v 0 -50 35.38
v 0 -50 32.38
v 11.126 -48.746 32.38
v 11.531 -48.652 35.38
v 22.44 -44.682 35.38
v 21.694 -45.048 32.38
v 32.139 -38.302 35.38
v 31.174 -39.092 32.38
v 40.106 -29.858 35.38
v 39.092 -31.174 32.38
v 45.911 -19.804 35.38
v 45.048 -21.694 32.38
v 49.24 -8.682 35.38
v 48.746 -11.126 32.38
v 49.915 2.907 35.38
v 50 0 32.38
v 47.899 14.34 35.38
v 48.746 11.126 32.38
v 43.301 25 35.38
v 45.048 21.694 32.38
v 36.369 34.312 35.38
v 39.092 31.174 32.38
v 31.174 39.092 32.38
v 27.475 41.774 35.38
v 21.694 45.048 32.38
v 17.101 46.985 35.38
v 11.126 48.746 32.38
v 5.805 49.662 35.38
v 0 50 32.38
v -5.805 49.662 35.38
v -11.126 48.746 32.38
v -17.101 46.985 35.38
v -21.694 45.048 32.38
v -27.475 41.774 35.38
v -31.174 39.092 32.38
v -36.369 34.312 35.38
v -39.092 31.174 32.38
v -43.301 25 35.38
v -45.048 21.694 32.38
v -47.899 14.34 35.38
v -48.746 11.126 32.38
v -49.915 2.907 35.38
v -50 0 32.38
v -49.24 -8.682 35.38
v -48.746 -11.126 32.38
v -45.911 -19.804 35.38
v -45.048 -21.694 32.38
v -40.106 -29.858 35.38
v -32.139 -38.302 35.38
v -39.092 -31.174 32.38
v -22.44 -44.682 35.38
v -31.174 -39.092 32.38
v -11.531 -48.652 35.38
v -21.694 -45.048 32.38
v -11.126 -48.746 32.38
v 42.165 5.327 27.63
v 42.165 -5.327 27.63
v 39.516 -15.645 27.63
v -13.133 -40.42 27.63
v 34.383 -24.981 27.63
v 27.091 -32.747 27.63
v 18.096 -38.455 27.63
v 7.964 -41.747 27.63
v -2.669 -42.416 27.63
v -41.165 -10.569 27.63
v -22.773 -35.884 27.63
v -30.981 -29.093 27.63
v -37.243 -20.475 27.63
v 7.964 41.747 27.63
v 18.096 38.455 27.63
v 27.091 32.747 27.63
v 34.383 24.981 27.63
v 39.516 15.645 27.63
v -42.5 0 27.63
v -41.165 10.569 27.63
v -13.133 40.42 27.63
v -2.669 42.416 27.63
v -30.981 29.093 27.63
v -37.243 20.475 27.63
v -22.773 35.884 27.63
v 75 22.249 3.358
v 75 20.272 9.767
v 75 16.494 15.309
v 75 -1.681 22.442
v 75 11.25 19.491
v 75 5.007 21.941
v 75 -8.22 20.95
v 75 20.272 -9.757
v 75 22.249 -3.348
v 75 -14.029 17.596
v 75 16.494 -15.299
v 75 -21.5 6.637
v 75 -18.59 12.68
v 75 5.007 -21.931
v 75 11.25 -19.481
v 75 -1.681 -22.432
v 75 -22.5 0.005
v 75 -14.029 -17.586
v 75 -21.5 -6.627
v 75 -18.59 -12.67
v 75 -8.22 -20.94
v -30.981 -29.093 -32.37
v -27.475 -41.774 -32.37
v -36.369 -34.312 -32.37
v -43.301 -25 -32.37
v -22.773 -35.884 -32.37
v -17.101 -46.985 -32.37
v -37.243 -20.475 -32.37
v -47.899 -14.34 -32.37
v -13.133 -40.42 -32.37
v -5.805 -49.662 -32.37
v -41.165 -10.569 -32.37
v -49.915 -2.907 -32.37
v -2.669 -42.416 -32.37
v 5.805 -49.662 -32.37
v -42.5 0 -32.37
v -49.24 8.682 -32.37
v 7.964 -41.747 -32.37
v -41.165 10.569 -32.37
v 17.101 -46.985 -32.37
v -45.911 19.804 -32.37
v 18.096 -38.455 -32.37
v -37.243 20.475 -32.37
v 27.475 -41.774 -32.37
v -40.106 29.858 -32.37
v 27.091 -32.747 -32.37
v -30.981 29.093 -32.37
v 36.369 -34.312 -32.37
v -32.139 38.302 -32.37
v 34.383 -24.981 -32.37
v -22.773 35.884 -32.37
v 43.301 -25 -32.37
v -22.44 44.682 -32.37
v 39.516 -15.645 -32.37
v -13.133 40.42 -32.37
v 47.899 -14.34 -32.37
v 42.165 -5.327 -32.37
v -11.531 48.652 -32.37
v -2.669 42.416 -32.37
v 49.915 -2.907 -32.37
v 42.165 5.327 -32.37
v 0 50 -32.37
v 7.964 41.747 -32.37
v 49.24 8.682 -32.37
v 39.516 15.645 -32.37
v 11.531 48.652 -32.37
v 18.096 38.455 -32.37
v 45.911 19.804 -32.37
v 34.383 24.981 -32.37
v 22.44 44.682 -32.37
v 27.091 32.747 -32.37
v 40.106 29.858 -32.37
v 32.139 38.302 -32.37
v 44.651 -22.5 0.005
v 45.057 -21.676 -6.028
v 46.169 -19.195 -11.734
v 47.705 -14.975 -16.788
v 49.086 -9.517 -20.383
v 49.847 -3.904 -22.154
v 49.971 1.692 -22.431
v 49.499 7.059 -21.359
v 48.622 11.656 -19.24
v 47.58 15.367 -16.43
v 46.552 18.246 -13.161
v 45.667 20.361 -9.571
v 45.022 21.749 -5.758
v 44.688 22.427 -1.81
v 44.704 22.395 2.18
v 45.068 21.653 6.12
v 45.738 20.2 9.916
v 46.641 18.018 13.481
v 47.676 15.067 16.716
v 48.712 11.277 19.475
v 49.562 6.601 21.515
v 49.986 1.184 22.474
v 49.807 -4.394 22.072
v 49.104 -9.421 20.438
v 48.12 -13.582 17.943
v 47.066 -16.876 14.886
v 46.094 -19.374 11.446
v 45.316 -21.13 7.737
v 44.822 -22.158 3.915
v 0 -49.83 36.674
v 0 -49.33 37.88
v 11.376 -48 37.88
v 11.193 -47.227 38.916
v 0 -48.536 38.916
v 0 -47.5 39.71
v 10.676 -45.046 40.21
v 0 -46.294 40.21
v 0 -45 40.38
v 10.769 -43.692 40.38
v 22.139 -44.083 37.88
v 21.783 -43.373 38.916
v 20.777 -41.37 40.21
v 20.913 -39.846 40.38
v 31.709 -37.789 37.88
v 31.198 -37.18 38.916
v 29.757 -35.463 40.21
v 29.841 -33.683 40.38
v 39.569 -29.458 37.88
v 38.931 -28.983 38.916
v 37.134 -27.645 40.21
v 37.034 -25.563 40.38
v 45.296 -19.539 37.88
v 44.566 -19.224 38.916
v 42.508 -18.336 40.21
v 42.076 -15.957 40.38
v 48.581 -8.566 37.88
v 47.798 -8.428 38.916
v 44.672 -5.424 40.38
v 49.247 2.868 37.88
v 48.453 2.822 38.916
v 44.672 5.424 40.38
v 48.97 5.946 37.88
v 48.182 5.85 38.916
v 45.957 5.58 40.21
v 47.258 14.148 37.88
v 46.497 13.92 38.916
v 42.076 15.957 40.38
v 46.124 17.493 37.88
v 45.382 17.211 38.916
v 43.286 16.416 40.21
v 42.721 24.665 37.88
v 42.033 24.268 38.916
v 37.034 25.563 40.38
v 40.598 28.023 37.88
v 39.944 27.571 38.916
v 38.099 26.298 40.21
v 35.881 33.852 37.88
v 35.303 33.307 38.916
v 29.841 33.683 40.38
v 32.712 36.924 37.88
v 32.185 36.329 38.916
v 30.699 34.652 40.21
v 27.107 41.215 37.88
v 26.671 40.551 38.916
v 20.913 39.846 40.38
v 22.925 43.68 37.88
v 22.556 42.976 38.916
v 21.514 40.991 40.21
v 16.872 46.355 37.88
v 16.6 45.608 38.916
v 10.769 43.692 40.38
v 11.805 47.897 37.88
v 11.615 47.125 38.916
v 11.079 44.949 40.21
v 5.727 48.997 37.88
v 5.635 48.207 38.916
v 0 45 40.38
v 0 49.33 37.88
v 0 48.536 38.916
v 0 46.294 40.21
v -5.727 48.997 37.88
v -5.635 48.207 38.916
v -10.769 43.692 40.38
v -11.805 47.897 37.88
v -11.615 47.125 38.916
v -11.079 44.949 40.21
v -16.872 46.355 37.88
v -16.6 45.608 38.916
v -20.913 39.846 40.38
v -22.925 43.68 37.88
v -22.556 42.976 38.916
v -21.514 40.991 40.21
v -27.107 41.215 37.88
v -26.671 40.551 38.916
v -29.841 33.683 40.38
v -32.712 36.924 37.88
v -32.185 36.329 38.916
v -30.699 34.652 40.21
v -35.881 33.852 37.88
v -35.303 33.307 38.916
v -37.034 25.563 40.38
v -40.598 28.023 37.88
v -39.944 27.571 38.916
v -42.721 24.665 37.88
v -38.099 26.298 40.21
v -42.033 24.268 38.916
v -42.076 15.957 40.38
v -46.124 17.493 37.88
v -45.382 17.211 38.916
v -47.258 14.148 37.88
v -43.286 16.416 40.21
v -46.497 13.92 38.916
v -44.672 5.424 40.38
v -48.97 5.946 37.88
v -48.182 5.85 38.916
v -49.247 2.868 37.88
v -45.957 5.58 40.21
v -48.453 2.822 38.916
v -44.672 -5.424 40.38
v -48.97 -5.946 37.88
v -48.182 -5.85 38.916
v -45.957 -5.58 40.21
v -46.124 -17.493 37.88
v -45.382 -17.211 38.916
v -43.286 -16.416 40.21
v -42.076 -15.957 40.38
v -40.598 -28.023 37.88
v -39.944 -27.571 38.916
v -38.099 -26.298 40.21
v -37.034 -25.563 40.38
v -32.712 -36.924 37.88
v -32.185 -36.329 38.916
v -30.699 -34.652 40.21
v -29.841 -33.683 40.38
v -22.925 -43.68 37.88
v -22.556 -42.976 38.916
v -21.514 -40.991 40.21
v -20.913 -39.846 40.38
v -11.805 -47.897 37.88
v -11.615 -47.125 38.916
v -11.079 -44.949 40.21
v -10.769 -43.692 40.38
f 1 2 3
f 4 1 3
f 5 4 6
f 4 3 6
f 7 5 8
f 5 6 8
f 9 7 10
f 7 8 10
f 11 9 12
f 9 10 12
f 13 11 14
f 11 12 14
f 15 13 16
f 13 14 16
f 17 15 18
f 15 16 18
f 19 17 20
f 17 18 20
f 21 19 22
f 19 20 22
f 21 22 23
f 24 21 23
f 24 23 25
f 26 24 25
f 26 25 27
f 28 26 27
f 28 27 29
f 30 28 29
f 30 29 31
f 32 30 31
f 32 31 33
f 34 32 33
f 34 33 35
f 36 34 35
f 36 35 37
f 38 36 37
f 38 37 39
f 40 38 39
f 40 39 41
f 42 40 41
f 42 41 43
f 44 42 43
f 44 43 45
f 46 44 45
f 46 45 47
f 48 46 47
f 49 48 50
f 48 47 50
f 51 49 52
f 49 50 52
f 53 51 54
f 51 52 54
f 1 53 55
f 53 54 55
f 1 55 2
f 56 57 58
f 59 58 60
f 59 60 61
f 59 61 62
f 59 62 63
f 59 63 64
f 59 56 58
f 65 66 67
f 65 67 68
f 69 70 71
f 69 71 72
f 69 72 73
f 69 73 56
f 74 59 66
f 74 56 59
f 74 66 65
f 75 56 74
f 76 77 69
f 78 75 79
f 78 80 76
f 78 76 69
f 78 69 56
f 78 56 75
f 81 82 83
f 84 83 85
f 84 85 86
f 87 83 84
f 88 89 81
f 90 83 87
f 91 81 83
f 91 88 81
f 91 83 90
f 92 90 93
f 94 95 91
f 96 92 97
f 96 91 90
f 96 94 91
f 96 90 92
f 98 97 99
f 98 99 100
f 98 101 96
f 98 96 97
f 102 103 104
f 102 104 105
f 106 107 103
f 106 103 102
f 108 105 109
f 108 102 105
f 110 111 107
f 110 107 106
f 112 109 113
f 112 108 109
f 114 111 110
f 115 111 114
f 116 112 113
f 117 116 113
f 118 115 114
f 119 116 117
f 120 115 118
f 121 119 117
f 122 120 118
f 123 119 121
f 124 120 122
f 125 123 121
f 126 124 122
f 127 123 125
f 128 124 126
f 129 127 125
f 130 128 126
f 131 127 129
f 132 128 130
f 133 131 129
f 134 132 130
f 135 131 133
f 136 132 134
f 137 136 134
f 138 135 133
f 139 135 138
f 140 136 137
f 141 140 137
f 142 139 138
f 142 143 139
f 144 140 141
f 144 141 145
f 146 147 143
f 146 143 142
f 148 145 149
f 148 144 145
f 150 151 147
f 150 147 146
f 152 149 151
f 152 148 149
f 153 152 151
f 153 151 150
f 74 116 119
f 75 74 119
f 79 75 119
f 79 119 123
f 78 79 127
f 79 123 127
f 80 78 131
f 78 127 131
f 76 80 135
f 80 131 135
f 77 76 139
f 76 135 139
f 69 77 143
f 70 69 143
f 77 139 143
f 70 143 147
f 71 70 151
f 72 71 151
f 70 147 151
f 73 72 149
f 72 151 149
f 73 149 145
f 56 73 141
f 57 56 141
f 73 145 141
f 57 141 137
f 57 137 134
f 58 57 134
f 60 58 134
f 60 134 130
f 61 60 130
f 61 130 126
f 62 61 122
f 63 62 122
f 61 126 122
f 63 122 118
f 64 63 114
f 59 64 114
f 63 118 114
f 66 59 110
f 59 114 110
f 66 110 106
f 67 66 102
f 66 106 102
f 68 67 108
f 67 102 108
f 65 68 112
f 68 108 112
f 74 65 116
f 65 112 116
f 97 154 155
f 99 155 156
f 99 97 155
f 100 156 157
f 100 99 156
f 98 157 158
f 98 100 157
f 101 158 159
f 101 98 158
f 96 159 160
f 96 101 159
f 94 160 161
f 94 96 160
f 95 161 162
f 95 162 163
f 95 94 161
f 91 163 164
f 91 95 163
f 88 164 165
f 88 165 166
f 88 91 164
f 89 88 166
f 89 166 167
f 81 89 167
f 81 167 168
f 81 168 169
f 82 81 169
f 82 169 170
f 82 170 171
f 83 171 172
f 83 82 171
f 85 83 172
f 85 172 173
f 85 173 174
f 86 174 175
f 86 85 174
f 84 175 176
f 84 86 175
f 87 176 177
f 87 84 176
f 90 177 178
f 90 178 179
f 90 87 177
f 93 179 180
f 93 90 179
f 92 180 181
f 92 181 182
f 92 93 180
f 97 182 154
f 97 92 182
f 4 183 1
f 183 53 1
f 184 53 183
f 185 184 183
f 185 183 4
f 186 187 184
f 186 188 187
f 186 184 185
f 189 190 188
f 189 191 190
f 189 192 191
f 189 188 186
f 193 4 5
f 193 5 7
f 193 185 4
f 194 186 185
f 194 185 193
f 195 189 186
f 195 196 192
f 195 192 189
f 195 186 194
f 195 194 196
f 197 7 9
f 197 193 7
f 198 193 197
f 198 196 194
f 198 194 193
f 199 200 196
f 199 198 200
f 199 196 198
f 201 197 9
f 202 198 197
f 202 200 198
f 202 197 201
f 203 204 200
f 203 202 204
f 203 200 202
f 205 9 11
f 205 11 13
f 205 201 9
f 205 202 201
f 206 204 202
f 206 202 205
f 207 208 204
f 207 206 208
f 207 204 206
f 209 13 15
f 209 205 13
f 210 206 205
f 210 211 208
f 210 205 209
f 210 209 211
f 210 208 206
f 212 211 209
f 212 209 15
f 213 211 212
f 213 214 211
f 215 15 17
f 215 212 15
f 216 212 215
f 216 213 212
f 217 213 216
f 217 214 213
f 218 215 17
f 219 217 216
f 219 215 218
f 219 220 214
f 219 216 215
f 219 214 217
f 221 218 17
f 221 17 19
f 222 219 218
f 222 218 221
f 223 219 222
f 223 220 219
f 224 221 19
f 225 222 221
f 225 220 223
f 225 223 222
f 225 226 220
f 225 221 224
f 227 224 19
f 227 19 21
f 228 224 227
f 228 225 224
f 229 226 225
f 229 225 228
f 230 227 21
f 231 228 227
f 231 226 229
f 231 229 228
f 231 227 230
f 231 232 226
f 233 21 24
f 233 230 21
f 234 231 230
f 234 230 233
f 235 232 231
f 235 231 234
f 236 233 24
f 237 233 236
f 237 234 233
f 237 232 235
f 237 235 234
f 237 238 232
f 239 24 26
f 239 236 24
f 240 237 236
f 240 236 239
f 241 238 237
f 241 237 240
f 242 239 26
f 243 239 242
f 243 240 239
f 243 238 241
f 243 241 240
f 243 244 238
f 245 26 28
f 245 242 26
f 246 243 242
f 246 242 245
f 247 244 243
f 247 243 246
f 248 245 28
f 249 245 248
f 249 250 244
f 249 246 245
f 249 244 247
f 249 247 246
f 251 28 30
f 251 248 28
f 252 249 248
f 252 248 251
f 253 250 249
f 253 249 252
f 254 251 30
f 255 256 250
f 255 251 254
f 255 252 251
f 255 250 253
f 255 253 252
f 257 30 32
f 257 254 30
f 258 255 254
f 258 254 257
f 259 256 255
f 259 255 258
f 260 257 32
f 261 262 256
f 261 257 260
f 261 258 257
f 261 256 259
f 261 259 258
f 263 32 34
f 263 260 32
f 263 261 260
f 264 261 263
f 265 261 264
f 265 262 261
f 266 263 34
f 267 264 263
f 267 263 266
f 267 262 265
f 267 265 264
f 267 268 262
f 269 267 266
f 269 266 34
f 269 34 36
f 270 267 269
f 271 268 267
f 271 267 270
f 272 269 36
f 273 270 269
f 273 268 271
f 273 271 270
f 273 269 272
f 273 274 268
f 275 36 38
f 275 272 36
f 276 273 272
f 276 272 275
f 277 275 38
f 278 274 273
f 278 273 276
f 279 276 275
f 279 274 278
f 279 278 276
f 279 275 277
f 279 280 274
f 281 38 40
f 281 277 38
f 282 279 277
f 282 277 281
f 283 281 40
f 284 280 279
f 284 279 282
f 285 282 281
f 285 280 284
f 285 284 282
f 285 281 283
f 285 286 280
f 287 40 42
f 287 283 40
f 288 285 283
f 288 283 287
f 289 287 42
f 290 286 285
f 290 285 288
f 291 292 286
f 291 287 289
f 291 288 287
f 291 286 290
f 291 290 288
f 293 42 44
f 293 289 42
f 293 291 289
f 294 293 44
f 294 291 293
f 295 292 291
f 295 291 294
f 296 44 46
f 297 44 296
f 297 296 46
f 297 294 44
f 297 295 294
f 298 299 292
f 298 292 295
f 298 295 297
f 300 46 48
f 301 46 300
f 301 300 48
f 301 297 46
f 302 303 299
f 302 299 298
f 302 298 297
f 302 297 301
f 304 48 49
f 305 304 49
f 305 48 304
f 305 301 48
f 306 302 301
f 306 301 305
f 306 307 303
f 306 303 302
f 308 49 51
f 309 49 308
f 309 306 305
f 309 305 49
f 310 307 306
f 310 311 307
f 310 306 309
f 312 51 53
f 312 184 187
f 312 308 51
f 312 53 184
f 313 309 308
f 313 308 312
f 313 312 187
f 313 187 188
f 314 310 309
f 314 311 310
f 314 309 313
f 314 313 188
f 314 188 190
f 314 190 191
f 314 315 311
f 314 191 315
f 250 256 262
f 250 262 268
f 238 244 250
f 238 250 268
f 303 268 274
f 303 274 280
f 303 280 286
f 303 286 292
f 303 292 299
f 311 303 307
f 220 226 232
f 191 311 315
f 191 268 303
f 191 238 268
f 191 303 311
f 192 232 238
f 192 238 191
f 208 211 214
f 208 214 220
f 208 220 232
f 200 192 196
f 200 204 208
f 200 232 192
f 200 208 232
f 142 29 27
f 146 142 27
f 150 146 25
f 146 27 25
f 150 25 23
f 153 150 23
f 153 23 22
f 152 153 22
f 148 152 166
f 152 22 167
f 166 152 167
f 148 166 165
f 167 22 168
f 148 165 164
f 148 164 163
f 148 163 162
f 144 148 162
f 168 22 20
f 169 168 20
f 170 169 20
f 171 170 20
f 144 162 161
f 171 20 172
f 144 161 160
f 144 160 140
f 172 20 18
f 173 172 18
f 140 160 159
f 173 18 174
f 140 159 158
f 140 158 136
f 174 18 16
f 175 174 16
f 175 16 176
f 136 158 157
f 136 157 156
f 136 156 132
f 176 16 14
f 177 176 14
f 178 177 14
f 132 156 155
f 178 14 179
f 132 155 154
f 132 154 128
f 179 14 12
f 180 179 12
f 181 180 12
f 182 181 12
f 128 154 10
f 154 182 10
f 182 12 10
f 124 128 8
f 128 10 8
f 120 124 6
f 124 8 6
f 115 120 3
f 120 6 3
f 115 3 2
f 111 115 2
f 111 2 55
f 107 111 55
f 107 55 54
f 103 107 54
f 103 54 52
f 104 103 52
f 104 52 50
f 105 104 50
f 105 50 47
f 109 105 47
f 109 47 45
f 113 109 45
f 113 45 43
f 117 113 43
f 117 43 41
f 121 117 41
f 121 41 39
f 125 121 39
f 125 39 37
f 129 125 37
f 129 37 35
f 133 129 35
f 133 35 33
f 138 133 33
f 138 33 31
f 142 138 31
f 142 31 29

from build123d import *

# Parameters (mm, degrees)
SKETCH2_R             = 50
BOSS_EXTRUDE1_DEPTH   = 64.75
BOSS_EXTRUDE2_START   = 8
SKETCH4_R             = 50
BOSS_EXTRUDE2_DEPTH   = 8
FILLET1_R             = 5
BODY_MOVE_COPY2_ANGLE = 120
SKETCH5_R             = 42.5
CUT_EXTRUDE1_DEPTH    = 60


with BuildPart() as part:
    # Sketch2 → Boss-Extrude1 (new body)
    with BuildSketch(Plane(origin=(0, 0, 0), x_dir=(0, 0, -1), z_dir=(1, 0, 0))):
        Circle(SKETCH2_R)
    extrude(amount=BOSS_EXTRUDE1_DEPTH)

    # Sketch3 → Revolve1 (revolve)
    with BuildSketch(Plane.ZY.offset(-32.375)):
        with BuildLine():
            Line((0, 75), (0, 50))
            ThreePointArc((0, 50), (11.563490229, 48.644482665), (22.5, 44.651427749))
            Line((22.5, 44.651427749), (22.5, 75))
            Line((22.5, 75), (0, 75))
        make_face()
    revolve(axis=Axis((32.375, 50, 0), (0, 1, 0)))

    # Sketch4 → Boss-Extrude2 (add)
    with BuildSketch(Plane.ZY.offset(BOSS_EXTRUDE2_START)):
        Circle(SKETCH4_R)
    extrude(amount=-BOSS_EXTRUDE2_DEPTH)

    # Fillet1
    fillet1_edges = [part.edges().sort_by_distance(p)[0] for p in [
        (-8, 0, -50),
    ]]
    fillet(fillet1_edges, radius=FILLET1_R)


with BuildPart() as part_1:
    # Body-Move/Copy1: moved
    add(part.part.moved(Location((-32.38, 0, 0))))


with BuildPart() as part_2:
    # Body-Move/Copy2: moved
    add(part_1.part.rotate(Axis((0, 0, 0), (0.5773502691896272, 0.5773502691896252, -0.5773502691896252)), BODY_MOVE_COPY2_ANGLE))

    # Sketch5 → Cut-Extrude1 (cut)
    with BuildSketch(Plane(origin=(0, 0, -32.37), x_dir=(-1, 0, 0), z_dir=(0, 0, -1))):
        Circle(SKETCH5_R)
    extrude(amount=-CUT_EXTRUDE1_DEPTH, mode=Mode.SUBTRACT)


solid = part_2.part
